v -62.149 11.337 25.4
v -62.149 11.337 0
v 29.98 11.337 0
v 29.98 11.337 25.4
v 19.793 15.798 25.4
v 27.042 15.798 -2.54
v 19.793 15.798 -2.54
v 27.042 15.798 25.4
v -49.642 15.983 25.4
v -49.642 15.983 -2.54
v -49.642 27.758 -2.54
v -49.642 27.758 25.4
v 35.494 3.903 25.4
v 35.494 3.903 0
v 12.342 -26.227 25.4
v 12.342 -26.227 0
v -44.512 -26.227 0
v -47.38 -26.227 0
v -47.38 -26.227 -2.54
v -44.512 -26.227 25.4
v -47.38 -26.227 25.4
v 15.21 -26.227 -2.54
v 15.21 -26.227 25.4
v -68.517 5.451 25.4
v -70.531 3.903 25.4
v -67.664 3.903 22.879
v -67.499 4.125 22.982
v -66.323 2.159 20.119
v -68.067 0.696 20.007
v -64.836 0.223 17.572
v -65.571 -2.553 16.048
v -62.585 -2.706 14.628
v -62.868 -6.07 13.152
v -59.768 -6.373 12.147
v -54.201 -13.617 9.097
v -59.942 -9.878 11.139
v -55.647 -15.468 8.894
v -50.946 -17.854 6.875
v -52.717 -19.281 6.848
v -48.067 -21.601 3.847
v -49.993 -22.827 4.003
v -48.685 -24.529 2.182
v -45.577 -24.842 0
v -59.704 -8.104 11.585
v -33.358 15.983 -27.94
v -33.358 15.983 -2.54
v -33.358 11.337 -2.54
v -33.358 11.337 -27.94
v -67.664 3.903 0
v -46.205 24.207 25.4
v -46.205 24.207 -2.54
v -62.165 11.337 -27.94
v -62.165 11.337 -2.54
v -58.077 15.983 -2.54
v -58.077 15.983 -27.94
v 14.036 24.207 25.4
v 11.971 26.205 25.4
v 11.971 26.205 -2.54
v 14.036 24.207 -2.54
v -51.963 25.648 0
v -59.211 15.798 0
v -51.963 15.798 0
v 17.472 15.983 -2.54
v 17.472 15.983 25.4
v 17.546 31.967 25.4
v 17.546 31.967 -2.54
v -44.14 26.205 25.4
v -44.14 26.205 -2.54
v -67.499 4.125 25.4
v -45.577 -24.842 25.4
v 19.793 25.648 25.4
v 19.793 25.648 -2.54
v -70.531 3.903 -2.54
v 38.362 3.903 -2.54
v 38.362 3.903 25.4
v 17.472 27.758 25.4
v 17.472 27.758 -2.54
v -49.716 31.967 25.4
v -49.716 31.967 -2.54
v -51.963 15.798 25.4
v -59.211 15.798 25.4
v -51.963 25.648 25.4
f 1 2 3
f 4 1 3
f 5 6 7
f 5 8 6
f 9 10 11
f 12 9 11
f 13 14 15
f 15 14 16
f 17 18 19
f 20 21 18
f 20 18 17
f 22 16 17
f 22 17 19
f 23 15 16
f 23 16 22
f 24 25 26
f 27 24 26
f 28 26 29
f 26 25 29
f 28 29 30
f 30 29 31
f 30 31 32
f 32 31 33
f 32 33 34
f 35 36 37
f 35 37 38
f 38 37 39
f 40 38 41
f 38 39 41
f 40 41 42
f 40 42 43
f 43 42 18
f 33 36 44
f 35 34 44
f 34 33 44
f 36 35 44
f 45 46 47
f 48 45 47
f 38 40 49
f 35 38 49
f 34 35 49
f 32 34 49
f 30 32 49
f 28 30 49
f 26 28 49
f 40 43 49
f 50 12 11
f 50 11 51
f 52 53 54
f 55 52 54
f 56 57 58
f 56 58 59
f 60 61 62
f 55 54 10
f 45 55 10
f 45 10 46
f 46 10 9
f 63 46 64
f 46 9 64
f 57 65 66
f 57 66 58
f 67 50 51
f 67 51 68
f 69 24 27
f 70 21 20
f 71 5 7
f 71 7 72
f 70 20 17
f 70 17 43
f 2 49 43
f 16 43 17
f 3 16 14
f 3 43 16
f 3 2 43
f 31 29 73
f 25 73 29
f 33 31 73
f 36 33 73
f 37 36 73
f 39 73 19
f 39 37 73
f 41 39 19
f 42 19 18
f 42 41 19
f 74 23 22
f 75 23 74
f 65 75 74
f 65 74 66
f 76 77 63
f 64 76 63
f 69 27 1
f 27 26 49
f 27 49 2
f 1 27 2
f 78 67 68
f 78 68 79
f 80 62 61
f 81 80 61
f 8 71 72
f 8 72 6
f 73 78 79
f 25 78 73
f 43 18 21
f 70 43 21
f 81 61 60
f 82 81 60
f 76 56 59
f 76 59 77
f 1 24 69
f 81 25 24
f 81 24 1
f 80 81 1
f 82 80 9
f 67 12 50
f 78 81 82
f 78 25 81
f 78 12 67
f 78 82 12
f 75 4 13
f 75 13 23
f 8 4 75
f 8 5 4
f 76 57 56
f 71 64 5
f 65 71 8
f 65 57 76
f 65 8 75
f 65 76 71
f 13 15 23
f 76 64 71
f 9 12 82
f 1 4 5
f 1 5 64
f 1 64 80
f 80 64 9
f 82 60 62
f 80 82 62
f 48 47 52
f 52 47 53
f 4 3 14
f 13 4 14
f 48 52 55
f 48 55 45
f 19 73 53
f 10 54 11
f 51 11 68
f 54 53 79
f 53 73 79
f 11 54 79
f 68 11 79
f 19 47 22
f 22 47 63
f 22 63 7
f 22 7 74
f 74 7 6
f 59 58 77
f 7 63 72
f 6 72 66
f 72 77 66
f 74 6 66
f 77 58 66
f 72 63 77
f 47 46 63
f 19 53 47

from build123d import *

# Parameters (mm, degrees)
F1_DEPTH = 25.4
F3_DEPTH = 2.54
F4_DEPTH = 2.54
F6_DEPTH = 25.4


with BuildPart() as f1:
    # F0 (on Top) → F1 (new body)
    with BuildSketch(Plane.XY):
        Polygon((35.4939039202, 3.9029268082), (12.342310436, -26.2274350854), (15.2102268336, -26.2274350854), (38.3618203178, 3.9029268082), (17.5462131575, 31.9668278098), (11.970603764, 26.2053646147), (14.0355655072, 24.2070145946), (17.4720109704, 27.7580083355), (17.4720109704, 15.9834139049), (-16.084820535, 15.9834139049), (-49.6416520405, 15.9834139049), (-49.6416520405, 27.7580083355), (-46.2052065773, 24.2070145946), (-44.1402448341, 26.2053646147), (-49.7158542275, 31.9668278098), (-70.5314613879, 3.9029268082), (-47.3798679037, -26.2274350854), (-44.5119515061, -26.2274350854), (-67.6635449903, 3.9029268082), (-62.1494763114, 11.3370735198), (-16.084820535, 11.3370735198), (29.9798352413, 11.3370735198), align=None)
        Polygon((-51.9630546496, 25.6478060037), (-51.9630546496, 15.7975610346), (-59.2113519833, 15.7975610346), align=None, mode=Mode.SUBTRACT)
        Polygon((19.7934135795, 15.7975610346), (19.7934135795, 25.6478060037), (27.0417109132, 15.7975610346), align=None, mode=Mode.SUBTRACT)
    extrude(amount=F1_DEPTH)

    # F2 (on face) → F3 (cut)
    with BuildSketch(Plane(origin=(-42.4623607514, -32.6272654131, 0), x_dir=(0.6092872739, -0.7929495683, 0), z_dir=(-0.7929495683, -0.6092872739, 0))):
        with BuildLine():
            Line((-8.0709172227, 25.4), (-46.0687459593, 25.4))
            add(Edge.make_bspline(
                [(-46.0687459593, 25.4), (-40.915928781, 17.5322014838), (-30.6555183473, 9.8364153651), (-15.6398303807, 8.4253717214), (-8.0709172227, 0)],
                knots=[0, 0, 0, 0, 0.4807876379, 1, 1, 1, 1], degree=3))
            Line((-8.0709172227, 0), (-8.0709172227, 25.4))
        make_face()
    extrude(amount=-F3_DEPTH, mode=Mode.SUBTRACT)

    # F0 (on Top) → F4 (join)
    with BuildSketch(Plane.XY):
        Polygon((-44.5119515061, -26.2274350854), (-16.084820535, -26.2274350854), (12.342310436, -26.2274350854), (35.4939039202, 3.9029268082), (29.9798352413, 11.3370735198), (-16.084820535, 11.3370735198), (-62.1494763114, 11.3370735198), (-67.6635449903, 3.9029268082), align=None)
        Polygon((35.4939039202, 3.9029268082), (12.342310436, -26.2274350854), (15.2102268336, -26.2274350854), (38.3618203178, 3.9029268082), (17.5462131575, 31.9668278098), (11.970603764, 26.2053646147), (14.0355655072, 24.2070145946), (17.4720109704, 27.7580083355), (17.4720109704, 15.9834139049), (-16.084820535, 15.9834139049), (-49.6416520405, 15.9834139049), (-49.6416520405, 27.7580083355), (-46.2052065773, 24.2070145946), (-44.1402448341, 26.2053646147), (-49.7158542275, 31.9668278098), (-70.5314613879, 3.9029268082), (-47.3798679037, -26.2274350854), (-44.5119515061, -26.2274350854), (-67.6635449903, 3.9029268082), (-62.1494763114, 11.3370735198), (-16.084820535, 11.3370735198), (29.9798352413, 11.3370735198), align=None)
        Polygon((-51.9630546496, 25.6478060037), (-51.9630546496, 15.7975610346), (-59.2113519833, 15.7975610346), align=None, mode=Mode.SUBTRACT)
        Polygon((19.7934135795, 15.7975610346), (19.7934135795, 25.6478060037), (27.0417109132, 15.7975610346), align=None, mode=Mode.SUBTRACT)
        Polygon((-59.2113519833, 15.7975610346), (-51.9630546496, 15.7975610346), (-51.9630546496, 25.6478060037), align=None)
    extrude(amount=-F4_DEPTH)

    # F5 (on face) → F6 (join)
    with BuildSketch(Plane(origin=(0, 0, -2.54), x_dir=(1, 0, 0), z_dir=(0, 0, -1))):
        Polygon((-49.6416520405, -15.9834139049), (-33.3581715822, -15.9834139049), (-33.3581715822, -11.3370744511), (-62.1654912829, -11.3370744511), (-58.0767057836, -15.9834139049), align=None)
    extrude(amount=F6_DEPTH)


solid = f1.part
